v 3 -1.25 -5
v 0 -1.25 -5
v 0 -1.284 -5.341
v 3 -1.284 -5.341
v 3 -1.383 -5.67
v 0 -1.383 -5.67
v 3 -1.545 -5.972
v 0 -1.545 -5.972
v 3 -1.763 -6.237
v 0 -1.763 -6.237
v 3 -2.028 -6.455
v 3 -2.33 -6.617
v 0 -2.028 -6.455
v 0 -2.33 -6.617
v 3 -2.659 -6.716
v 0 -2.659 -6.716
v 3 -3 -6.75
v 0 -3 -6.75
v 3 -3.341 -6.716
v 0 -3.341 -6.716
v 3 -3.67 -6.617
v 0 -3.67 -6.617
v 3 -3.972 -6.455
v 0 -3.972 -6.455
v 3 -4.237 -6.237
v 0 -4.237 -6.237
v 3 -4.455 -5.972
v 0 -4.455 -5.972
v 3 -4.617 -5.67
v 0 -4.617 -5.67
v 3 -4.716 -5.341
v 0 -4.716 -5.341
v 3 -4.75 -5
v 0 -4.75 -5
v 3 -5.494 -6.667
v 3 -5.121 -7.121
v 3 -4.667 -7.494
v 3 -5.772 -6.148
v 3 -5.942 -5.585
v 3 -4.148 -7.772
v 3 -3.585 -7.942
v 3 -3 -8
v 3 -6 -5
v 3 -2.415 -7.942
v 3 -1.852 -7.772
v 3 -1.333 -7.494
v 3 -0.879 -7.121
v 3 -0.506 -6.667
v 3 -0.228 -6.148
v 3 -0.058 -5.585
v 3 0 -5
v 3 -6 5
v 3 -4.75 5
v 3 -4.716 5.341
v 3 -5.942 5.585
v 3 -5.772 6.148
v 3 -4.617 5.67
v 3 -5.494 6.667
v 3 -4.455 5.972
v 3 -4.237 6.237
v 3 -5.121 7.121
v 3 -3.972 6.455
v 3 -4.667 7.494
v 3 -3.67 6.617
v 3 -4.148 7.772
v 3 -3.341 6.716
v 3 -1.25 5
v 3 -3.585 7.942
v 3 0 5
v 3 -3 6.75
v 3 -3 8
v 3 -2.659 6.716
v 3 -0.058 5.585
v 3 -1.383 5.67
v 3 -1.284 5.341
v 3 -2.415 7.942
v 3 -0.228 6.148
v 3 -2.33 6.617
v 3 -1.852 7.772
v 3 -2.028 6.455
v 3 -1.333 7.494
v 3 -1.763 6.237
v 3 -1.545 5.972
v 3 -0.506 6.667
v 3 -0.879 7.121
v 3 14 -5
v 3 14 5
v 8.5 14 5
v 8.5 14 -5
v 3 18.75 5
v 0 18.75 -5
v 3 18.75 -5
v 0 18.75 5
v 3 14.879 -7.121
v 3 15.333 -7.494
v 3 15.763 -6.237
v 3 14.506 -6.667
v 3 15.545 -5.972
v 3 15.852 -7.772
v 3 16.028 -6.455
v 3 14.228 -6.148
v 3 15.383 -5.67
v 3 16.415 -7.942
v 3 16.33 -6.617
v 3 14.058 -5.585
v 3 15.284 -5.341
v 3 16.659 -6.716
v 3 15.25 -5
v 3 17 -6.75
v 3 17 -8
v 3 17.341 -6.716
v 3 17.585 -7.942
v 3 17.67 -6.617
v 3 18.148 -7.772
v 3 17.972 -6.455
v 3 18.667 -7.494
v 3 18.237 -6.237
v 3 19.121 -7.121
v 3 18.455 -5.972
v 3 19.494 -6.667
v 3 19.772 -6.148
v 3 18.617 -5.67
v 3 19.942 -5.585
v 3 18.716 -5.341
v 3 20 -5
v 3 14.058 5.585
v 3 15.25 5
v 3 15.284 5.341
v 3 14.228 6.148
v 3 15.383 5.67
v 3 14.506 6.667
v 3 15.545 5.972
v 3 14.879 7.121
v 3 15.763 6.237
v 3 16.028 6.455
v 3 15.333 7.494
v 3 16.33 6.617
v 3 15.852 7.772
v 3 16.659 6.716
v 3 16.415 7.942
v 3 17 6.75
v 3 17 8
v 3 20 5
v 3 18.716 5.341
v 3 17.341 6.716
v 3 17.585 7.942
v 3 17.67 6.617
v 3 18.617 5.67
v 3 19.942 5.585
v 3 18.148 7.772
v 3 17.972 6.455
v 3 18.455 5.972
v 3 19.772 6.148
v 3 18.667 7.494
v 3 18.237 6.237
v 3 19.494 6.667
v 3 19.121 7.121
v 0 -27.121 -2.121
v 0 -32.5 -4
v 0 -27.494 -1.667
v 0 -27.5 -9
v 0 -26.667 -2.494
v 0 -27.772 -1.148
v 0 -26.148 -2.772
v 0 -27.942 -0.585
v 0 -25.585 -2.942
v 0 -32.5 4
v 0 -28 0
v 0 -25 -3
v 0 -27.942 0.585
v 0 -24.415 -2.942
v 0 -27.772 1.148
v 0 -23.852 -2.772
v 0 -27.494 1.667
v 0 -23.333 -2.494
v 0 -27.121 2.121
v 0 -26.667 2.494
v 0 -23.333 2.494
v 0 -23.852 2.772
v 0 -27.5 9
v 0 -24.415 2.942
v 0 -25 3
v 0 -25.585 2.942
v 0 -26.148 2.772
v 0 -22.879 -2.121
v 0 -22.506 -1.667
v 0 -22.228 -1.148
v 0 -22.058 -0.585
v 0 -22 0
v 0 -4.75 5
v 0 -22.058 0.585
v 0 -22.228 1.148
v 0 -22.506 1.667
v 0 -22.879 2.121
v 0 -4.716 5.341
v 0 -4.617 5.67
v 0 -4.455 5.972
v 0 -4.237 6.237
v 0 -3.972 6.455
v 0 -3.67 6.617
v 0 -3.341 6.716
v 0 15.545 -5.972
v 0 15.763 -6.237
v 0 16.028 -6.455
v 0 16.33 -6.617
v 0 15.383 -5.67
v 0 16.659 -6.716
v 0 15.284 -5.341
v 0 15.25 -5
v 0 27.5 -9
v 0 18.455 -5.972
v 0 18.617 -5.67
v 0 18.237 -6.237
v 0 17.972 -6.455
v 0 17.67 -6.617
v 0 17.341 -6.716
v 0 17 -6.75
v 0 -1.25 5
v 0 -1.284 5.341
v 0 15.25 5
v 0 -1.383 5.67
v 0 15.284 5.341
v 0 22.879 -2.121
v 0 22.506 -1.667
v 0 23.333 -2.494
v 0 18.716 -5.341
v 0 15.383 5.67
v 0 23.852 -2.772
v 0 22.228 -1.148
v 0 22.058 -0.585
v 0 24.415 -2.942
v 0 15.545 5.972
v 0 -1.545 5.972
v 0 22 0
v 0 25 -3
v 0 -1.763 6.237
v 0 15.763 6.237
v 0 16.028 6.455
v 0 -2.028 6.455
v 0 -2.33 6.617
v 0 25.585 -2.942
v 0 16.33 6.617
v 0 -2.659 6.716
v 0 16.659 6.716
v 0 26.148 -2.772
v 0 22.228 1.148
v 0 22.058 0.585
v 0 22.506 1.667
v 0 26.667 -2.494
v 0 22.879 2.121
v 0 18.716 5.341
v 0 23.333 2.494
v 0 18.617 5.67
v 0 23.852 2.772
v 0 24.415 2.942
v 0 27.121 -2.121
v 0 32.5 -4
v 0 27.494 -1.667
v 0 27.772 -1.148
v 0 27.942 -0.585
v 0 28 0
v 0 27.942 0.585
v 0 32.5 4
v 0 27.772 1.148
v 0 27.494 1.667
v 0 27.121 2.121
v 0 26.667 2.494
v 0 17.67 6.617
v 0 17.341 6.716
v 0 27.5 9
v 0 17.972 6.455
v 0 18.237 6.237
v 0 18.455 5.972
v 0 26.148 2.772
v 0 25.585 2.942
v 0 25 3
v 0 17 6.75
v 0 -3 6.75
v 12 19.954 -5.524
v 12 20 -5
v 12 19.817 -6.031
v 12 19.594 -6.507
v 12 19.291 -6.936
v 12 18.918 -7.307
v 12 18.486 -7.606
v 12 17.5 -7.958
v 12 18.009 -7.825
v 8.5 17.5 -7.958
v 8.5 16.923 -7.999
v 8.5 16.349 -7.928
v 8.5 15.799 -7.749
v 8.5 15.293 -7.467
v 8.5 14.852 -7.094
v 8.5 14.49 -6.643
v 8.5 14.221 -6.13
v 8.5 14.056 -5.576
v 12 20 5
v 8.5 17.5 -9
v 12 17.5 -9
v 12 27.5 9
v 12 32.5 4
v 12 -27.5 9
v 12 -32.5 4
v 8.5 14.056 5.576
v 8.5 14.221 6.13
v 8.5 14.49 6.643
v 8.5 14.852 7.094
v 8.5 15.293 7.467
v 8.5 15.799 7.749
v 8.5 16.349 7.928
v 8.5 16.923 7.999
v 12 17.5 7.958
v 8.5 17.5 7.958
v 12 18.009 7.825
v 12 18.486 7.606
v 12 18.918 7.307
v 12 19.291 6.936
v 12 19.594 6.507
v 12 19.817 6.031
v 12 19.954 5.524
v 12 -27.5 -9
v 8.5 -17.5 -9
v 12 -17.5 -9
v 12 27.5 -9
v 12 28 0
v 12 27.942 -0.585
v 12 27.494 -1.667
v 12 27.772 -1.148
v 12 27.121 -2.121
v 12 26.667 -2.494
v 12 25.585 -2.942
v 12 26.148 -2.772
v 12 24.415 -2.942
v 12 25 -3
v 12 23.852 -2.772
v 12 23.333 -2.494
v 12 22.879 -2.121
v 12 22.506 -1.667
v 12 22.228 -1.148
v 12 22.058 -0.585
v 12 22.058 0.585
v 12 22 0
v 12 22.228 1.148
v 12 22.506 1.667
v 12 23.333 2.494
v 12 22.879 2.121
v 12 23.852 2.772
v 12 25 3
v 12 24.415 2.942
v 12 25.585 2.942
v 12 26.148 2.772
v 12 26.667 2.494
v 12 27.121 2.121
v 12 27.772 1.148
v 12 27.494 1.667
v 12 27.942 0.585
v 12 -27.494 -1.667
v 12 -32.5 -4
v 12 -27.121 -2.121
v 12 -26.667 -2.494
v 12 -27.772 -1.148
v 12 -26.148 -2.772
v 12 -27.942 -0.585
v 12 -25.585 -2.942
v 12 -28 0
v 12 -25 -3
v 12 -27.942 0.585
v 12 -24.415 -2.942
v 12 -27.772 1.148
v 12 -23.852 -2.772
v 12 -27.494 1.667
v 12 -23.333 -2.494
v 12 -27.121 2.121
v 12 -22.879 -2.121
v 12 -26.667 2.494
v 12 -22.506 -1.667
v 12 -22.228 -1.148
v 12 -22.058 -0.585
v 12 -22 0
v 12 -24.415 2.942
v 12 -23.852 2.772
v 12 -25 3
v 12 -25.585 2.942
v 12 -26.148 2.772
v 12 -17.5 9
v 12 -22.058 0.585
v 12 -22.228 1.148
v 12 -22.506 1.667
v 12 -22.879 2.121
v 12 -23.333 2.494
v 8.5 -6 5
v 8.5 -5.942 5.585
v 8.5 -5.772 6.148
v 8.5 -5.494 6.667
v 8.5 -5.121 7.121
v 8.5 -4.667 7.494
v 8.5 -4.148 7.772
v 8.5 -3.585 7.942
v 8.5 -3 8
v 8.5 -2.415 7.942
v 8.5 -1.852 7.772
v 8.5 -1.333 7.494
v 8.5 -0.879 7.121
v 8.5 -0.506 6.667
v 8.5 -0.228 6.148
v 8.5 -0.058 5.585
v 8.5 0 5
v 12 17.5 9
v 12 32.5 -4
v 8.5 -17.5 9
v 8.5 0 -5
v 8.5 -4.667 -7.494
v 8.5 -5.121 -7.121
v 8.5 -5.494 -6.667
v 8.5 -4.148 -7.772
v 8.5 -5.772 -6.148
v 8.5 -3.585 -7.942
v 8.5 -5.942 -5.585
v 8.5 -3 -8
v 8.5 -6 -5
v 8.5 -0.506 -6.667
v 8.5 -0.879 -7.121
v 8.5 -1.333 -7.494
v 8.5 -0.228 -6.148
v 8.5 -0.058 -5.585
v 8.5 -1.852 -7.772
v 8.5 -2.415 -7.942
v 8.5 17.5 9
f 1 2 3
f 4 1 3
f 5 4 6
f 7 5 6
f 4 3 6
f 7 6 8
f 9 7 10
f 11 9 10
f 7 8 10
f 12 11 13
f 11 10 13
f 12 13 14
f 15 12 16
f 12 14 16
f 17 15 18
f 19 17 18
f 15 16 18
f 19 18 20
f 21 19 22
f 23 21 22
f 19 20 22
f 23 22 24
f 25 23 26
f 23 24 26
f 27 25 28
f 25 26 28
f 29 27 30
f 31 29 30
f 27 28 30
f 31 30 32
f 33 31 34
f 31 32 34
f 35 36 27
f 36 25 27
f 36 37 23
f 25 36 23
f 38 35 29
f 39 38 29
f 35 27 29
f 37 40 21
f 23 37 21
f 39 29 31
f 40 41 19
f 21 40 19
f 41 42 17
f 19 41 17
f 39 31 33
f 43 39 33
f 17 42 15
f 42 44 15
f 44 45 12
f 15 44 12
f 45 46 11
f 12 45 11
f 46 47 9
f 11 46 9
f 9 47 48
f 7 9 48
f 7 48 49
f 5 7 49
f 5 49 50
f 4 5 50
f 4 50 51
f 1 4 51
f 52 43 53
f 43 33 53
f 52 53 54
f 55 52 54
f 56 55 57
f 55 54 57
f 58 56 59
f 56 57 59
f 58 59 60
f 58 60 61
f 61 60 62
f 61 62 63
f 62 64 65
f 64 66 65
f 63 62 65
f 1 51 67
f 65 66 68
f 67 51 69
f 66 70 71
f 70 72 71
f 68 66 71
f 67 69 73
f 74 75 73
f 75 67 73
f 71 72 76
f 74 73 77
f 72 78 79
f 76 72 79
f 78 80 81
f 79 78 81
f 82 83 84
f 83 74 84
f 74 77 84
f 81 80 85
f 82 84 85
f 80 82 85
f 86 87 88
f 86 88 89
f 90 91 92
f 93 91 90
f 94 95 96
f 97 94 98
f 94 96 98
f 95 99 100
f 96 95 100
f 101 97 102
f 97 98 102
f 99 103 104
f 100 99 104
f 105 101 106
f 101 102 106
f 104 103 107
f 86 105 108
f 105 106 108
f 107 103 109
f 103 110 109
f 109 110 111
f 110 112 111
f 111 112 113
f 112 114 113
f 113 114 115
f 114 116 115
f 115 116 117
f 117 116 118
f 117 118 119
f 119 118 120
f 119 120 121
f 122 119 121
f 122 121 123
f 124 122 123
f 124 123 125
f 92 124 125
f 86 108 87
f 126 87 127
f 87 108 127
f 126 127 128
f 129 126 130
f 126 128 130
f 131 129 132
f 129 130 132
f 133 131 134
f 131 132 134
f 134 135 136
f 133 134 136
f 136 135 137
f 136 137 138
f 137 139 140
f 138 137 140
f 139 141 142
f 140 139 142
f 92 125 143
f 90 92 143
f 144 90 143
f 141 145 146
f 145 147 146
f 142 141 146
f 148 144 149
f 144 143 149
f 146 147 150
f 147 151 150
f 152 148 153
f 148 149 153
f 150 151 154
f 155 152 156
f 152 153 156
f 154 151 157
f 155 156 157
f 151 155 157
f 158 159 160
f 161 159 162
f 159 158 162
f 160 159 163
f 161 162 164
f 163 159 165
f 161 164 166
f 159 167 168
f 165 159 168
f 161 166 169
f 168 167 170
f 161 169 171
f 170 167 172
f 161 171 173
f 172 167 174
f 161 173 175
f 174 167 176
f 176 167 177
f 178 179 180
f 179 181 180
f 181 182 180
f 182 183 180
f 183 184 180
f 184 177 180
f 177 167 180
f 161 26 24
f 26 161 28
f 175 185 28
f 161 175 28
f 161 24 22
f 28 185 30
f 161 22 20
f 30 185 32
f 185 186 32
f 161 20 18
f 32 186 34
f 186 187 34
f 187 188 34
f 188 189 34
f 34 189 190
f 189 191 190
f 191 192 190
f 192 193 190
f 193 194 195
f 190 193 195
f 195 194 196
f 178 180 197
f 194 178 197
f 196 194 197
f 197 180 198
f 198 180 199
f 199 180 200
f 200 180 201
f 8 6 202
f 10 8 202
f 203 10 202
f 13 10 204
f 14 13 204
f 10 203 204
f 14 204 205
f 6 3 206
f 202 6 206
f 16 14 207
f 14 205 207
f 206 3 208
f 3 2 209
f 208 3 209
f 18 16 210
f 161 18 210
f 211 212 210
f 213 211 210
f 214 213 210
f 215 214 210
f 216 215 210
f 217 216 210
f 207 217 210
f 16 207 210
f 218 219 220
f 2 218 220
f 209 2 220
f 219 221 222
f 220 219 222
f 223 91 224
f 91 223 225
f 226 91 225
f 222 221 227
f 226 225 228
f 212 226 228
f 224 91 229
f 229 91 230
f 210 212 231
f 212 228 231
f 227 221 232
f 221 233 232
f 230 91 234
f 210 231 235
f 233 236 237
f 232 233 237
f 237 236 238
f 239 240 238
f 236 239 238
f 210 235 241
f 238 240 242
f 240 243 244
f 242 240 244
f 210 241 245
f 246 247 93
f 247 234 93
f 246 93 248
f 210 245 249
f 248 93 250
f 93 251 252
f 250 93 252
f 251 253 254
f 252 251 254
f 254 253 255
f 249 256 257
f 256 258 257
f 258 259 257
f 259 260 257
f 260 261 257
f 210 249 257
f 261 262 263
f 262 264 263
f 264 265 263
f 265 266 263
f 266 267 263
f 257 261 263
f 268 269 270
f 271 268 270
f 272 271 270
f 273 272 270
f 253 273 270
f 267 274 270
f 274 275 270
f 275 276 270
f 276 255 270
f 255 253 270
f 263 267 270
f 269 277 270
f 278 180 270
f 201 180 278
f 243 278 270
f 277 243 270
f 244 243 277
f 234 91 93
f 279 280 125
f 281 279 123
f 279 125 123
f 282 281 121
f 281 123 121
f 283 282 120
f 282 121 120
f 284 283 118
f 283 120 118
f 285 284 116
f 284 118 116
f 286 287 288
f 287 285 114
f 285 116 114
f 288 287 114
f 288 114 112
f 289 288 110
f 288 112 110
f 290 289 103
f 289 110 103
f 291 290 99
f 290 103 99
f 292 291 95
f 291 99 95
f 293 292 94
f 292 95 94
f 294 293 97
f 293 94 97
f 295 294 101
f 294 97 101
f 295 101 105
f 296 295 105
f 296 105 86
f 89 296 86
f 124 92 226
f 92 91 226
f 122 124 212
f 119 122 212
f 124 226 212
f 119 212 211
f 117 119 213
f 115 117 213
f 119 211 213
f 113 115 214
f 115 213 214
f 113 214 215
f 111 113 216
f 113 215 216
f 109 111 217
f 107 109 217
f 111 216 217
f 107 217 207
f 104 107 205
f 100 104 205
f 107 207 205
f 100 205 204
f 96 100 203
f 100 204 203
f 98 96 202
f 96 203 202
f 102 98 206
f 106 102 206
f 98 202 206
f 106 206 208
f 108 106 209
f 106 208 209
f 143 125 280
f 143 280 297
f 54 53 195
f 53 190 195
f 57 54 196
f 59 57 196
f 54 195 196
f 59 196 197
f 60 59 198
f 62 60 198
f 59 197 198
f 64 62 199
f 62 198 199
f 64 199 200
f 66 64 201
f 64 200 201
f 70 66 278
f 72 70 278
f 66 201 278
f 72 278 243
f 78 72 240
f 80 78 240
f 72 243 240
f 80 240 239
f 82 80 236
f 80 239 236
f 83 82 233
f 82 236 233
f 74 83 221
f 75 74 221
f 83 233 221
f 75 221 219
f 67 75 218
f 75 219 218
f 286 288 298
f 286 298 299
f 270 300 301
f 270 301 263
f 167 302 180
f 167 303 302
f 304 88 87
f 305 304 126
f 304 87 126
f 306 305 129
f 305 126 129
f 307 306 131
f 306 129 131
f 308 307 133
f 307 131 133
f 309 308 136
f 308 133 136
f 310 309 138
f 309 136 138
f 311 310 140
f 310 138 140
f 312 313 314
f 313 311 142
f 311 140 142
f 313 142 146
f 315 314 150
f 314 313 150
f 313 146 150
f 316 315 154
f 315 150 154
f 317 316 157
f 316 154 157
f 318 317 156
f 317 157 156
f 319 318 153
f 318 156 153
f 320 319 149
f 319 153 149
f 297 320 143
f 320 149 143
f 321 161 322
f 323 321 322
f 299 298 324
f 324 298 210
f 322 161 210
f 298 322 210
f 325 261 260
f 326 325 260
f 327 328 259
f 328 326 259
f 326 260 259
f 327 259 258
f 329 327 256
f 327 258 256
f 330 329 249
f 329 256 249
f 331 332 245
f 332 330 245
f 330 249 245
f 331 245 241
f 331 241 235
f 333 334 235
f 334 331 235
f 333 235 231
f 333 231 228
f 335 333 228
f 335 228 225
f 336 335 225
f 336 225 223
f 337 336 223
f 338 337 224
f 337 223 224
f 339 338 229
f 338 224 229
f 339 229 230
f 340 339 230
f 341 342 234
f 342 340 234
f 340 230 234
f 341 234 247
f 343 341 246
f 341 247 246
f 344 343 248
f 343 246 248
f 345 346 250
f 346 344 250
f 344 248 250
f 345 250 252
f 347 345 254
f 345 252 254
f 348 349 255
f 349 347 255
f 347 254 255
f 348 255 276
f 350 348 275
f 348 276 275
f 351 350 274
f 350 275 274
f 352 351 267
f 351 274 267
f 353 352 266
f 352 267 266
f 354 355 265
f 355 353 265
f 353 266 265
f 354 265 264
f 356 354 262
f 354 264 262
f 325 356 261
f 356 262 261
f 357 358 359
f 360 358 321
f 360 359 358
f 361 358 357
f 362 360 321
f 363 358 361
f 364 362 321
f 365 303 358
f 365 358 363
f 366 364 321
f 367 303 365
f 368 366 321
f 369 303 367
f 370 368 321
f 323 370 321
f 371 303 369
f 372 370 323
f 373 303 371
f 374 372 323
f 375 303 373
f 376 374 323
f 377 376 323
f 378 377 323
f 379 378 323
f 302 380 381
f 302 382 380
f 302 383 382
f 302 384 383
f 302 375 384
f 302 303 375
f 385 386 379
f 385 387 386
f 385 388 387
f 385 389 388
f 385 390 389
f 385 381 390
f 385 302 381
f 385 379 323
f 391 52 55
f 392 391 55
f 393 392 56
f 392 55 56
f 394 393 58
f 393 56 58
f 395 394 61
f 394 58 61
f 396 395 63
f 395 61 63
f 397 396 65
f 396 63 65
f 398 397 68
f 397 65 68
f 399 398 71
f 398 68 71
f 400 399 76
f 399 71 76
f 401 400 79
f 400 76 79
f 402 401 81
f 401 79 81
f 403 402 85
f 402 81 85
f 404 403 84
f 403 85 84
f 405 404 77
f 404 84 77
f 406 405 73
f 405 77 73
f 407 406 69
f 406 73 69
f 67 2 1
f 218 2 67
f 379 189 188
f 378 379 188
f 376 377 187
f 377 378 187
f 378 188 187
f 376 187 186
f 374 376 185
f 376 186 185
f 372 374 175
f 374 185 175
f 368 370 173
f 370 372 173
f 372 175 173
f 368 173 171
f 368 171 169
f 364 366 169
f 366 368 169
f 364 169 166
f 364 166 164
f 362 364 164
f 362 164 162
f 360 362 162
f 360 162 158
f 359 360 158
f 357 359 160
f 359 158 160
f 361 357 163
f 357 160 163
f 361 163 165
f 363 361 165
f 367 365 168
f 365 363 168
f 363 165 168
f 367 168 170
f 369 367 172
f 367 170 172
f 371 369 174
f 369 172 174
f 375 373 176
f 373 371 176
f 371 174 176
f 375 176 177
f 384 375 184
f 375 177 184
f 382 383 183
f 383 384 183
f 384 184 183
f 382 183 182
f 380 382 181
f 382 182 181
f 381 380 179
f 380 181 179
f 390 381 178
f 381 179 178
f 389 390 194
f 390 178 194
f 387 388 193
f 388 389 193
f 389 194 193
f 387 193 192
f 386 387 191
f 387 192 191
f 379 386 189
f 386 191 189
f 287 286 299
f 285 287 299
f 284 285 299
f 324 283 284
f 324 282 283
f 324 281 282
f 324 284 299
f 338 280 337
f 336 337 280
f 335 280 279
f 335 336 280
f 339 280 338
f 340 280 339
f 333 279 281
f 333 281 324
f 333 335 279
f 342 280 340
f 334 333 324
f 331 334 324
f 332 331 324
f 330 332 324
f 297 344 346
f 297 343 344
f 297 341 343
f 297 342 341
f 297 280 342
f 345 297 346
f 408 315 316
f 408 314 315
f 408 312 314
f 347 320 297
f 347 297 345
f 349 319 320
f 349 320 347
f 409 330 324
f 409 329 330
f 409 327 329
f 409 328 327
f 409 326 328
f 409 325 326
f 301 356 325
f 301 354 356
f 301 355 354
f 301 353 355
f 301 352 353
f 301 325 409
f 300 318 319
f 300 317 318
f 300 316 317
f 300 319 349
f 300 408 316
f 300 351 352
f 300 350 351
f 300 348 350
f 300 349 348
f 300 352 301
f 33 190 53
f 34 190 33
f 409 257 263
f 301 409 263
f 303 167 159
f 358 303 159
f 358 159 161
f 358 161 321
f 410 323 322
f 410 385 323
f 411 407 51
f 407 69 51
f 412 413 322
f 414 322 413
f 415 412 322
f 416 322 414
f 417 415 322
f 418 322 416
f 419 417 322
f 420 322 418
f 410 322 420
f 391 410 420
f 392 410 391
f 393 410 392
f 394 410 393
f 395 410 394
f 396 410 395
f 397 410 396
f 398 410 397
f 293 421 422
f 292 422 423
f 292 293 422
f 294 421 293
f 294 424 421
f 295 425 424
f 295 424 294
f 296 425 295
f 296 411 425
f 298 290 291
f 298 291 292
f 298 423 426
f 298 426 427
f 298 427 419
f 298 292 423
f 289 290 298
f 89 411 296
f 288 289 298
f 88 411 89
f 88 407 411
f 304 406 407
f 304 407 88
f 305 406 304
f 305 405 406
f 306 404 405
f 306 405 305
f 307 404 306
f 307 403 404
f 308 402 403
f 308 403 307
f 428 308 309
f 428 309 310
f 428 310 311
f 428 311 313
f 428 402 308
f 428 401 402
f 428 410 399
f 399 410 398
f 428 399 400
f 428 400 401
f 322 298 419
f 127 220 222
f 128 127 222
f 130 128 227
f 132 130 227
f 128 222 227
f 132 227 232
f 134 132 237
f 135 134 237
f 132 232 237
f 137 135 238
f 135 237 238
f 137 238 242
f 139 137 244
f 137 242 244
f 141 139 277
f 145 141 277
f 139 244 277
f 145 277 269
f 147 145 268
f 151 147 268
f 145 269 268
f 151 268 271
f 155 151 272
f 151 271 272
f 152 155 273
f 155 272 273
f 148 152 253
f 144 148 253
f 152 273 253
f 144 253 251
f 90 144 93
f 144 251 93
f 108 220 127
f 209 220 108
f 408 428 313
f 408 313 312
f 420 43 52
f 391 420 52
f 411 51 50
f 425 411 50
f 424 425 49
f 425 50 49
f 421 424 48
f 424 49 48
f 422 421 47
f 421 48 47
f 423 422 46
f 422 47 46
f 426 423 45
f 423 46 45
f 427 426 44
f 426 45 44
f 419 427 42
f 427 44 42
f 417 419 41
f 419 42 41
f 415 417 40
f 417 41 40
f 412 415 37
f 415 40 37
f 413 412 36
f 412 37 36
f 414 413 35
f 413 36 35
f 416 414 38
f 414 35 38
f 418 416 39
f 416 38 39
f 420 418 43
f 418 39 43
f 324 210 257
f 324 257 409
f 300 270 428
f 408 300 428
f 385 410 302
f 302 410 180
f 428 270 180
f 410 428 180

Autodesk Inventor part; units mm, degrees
ref_plane "YZ Plane" through (0, 0, 0) normal (1, 0, 0) x (0, 1, 0)
ref_plane "XZ Plane" through (0, 0, 0) normal (0, 1, 0) x (-1, 0, 0)
ref_plane "XY Plane" through (0, 0, 0) normal (0, 0, 1) x (1, 0, 0)
sketch "Sketch1" plane through (0, 0, 0) normal (1, 0, 0) x (0, 1, 0)
  line L0 (32.5, 9) -> (-32.5, 9)
  line L1 (-32.5, 9) -> (-32.5, -9)
  line L2 (-32.5, -9) -> (32.5, -9)
  line L3 (32.5, -9) -> (32.5, 9)
  line L4 (32.5, 9) -> (-32.5, -9) construction
  line L5 (-32.5, 9) -> (32.5, -9) construction
  circle A0 centre (-25, 0) radius 3
  circle A1 centre (25, 0) radius 3
  line L6 (-3, -5) -> (-3, 5) construction
  line L7 (-6, -5) -> (-6, 5)
  line L8 (0, 5) -> (0, -5)
  arc A2 (-6, -5) -> (0, -5) centre (-3, -5) ccw
  arc A3 (0, 5) -> (-6, 5) centre (-3, 5) ccw
  line L9 (17, -5) -> (17, 5) construction
  line L10 (20, -5) -> (20, 5)
  line L11 (14, 5) -> (14, -5)
  arc A4 (14, -5) -> (20, -5) centre (17, -5) ccw
  arc A5 (20, 5) -> (14, 5) centre (17, 5) ccw
  point P0 (0, 0)
  point P1 (-3, 0)
  point P2 (17, 0)
  point P3 (0, 0)
  dimension "d0" = 25
  dimension "d1" = 50
  dimension "d2" = 65
  dimension "d3" = 6
  dimension "d5" = 20
  dimension "d6" = 10
  dimension "d7" = 3
  dimension "d8" = 18
  dimension "d36" = 3
extrude "Extrusion1" add sketch "Sketch1" along normal blind 12
sketch "Sketch2" plane through (0, 0, 0) normal (-1, 0, 0) x (0, 0, 1)
  line L0 (9, -32.5) -> (-9, -32.5) projected
  line L1 (9, 32.5) -> (9, -32.5) projected
  line L2 (-9, 32.5) -> (9, 32.5) projected
  line L3 (-9, -32.5) -> (-9, 32.5) projected
  circle A0 centre (0, -25) radius 3 projected
  circle A1 centre (0, 25) radius 3 projected
  arc A2 (-5, 20) -> (-5, 14) centre (-5, 17) ccw projected
  line L4 (5, 20) -> (-5, 20) projected
  arc A3 (5, 14) -> (5, 20) centre (5, 17) ccw projected
  line L5 (-5, 14) -> (5, 14) projected
  line L6 (5, 0) -> (-5, 0) projected
  arc A4 (5, -6) -> (5, 0) centre (5, -3) ccw projected
  line L7 (-5, -6) -> (5, -6) projected
  arc A5 (-5, 0) -> (-5, -6) centre (-5, -3) ccw projected
  line L8 (5, 17) -> (-5, 17) construction
  line L9 (5, 15.25) -> (-5, 15.25)
  line L10 (-5, 18.75) -> (5, 18.75)
  arc A6 (5, 15.25) -> (5, 18.75) centre (5, 17) ccw
  arc A7 (-5, 18.75) -> (-5, 15.25) centre (-5, 17) ccw
  line L11 (5, -3) -> (-5, -3) construction
  line L12 (5, -4.75) -> (-5, -4.75)
  line L13 (-5, -1.25) -> (5, -1.25)
  arc A8 (5, -4.75) -> (5, -1.25) centre (5, -3) ccw
  arc A9 (-5, -1.25) -> (-5, -4.75) centre (-5, -3) ccw
  point P0 (0, 0)
  point P1 (0, 17)
  point P2 (0, -3)
  dimension "d11" = 3.5
extrude "Extrusion2" add sketch "Sketch2" against normal blind 3 contours L4 A3 L5 A2 | A4 L7 A5 L6
chamfer "Chamfer1" distance 5 angle 45 4 edges at (6, -32.5, 9) (6, -32.5, -9) (6, 32.5, -9) (6, 32.5, 9)
sketch "Sketch3" plane through (0, -27.5, 9) normal (0, 0, 1) x (1, 0, 0)
  line L0 (0, 55) -> (12, 55) projected
  line L1 (0, 55) -> (0, 0) projected
  line L2 (12, 0) -> (0, 0) projected
  line L3 (12, 55) -> (12, 0) projected
  line L4 (12, 10) -> (8.5, 10)
  line L5 (8.5, 10) -> (8.5, 45)
  line L6 (8.5, 45) -> (12, 45)
  line L7 (12, 45) -> (12, 10)
  line L8 (12, 10) -> (8.5, 45) construction
  line L9 (8.5, 10) -> (12, 45) construction
  point P0 (0, 27.5)
  point P1 (10.25, 27.5)
  point P2 (0, 27.5)
  point P3 (12, 10)
  dimension "d17" = 35
  dimension "d18" = 3.5
extrude "Extrusion3" cut sketch "Sketch3" against normal through all contours L3 L4 L5 L6
equation "\"d1\" = 2 * d0"
equation "\"d36\" = d7"
properties part number "ToolDock_R" material "PET Plastic"
